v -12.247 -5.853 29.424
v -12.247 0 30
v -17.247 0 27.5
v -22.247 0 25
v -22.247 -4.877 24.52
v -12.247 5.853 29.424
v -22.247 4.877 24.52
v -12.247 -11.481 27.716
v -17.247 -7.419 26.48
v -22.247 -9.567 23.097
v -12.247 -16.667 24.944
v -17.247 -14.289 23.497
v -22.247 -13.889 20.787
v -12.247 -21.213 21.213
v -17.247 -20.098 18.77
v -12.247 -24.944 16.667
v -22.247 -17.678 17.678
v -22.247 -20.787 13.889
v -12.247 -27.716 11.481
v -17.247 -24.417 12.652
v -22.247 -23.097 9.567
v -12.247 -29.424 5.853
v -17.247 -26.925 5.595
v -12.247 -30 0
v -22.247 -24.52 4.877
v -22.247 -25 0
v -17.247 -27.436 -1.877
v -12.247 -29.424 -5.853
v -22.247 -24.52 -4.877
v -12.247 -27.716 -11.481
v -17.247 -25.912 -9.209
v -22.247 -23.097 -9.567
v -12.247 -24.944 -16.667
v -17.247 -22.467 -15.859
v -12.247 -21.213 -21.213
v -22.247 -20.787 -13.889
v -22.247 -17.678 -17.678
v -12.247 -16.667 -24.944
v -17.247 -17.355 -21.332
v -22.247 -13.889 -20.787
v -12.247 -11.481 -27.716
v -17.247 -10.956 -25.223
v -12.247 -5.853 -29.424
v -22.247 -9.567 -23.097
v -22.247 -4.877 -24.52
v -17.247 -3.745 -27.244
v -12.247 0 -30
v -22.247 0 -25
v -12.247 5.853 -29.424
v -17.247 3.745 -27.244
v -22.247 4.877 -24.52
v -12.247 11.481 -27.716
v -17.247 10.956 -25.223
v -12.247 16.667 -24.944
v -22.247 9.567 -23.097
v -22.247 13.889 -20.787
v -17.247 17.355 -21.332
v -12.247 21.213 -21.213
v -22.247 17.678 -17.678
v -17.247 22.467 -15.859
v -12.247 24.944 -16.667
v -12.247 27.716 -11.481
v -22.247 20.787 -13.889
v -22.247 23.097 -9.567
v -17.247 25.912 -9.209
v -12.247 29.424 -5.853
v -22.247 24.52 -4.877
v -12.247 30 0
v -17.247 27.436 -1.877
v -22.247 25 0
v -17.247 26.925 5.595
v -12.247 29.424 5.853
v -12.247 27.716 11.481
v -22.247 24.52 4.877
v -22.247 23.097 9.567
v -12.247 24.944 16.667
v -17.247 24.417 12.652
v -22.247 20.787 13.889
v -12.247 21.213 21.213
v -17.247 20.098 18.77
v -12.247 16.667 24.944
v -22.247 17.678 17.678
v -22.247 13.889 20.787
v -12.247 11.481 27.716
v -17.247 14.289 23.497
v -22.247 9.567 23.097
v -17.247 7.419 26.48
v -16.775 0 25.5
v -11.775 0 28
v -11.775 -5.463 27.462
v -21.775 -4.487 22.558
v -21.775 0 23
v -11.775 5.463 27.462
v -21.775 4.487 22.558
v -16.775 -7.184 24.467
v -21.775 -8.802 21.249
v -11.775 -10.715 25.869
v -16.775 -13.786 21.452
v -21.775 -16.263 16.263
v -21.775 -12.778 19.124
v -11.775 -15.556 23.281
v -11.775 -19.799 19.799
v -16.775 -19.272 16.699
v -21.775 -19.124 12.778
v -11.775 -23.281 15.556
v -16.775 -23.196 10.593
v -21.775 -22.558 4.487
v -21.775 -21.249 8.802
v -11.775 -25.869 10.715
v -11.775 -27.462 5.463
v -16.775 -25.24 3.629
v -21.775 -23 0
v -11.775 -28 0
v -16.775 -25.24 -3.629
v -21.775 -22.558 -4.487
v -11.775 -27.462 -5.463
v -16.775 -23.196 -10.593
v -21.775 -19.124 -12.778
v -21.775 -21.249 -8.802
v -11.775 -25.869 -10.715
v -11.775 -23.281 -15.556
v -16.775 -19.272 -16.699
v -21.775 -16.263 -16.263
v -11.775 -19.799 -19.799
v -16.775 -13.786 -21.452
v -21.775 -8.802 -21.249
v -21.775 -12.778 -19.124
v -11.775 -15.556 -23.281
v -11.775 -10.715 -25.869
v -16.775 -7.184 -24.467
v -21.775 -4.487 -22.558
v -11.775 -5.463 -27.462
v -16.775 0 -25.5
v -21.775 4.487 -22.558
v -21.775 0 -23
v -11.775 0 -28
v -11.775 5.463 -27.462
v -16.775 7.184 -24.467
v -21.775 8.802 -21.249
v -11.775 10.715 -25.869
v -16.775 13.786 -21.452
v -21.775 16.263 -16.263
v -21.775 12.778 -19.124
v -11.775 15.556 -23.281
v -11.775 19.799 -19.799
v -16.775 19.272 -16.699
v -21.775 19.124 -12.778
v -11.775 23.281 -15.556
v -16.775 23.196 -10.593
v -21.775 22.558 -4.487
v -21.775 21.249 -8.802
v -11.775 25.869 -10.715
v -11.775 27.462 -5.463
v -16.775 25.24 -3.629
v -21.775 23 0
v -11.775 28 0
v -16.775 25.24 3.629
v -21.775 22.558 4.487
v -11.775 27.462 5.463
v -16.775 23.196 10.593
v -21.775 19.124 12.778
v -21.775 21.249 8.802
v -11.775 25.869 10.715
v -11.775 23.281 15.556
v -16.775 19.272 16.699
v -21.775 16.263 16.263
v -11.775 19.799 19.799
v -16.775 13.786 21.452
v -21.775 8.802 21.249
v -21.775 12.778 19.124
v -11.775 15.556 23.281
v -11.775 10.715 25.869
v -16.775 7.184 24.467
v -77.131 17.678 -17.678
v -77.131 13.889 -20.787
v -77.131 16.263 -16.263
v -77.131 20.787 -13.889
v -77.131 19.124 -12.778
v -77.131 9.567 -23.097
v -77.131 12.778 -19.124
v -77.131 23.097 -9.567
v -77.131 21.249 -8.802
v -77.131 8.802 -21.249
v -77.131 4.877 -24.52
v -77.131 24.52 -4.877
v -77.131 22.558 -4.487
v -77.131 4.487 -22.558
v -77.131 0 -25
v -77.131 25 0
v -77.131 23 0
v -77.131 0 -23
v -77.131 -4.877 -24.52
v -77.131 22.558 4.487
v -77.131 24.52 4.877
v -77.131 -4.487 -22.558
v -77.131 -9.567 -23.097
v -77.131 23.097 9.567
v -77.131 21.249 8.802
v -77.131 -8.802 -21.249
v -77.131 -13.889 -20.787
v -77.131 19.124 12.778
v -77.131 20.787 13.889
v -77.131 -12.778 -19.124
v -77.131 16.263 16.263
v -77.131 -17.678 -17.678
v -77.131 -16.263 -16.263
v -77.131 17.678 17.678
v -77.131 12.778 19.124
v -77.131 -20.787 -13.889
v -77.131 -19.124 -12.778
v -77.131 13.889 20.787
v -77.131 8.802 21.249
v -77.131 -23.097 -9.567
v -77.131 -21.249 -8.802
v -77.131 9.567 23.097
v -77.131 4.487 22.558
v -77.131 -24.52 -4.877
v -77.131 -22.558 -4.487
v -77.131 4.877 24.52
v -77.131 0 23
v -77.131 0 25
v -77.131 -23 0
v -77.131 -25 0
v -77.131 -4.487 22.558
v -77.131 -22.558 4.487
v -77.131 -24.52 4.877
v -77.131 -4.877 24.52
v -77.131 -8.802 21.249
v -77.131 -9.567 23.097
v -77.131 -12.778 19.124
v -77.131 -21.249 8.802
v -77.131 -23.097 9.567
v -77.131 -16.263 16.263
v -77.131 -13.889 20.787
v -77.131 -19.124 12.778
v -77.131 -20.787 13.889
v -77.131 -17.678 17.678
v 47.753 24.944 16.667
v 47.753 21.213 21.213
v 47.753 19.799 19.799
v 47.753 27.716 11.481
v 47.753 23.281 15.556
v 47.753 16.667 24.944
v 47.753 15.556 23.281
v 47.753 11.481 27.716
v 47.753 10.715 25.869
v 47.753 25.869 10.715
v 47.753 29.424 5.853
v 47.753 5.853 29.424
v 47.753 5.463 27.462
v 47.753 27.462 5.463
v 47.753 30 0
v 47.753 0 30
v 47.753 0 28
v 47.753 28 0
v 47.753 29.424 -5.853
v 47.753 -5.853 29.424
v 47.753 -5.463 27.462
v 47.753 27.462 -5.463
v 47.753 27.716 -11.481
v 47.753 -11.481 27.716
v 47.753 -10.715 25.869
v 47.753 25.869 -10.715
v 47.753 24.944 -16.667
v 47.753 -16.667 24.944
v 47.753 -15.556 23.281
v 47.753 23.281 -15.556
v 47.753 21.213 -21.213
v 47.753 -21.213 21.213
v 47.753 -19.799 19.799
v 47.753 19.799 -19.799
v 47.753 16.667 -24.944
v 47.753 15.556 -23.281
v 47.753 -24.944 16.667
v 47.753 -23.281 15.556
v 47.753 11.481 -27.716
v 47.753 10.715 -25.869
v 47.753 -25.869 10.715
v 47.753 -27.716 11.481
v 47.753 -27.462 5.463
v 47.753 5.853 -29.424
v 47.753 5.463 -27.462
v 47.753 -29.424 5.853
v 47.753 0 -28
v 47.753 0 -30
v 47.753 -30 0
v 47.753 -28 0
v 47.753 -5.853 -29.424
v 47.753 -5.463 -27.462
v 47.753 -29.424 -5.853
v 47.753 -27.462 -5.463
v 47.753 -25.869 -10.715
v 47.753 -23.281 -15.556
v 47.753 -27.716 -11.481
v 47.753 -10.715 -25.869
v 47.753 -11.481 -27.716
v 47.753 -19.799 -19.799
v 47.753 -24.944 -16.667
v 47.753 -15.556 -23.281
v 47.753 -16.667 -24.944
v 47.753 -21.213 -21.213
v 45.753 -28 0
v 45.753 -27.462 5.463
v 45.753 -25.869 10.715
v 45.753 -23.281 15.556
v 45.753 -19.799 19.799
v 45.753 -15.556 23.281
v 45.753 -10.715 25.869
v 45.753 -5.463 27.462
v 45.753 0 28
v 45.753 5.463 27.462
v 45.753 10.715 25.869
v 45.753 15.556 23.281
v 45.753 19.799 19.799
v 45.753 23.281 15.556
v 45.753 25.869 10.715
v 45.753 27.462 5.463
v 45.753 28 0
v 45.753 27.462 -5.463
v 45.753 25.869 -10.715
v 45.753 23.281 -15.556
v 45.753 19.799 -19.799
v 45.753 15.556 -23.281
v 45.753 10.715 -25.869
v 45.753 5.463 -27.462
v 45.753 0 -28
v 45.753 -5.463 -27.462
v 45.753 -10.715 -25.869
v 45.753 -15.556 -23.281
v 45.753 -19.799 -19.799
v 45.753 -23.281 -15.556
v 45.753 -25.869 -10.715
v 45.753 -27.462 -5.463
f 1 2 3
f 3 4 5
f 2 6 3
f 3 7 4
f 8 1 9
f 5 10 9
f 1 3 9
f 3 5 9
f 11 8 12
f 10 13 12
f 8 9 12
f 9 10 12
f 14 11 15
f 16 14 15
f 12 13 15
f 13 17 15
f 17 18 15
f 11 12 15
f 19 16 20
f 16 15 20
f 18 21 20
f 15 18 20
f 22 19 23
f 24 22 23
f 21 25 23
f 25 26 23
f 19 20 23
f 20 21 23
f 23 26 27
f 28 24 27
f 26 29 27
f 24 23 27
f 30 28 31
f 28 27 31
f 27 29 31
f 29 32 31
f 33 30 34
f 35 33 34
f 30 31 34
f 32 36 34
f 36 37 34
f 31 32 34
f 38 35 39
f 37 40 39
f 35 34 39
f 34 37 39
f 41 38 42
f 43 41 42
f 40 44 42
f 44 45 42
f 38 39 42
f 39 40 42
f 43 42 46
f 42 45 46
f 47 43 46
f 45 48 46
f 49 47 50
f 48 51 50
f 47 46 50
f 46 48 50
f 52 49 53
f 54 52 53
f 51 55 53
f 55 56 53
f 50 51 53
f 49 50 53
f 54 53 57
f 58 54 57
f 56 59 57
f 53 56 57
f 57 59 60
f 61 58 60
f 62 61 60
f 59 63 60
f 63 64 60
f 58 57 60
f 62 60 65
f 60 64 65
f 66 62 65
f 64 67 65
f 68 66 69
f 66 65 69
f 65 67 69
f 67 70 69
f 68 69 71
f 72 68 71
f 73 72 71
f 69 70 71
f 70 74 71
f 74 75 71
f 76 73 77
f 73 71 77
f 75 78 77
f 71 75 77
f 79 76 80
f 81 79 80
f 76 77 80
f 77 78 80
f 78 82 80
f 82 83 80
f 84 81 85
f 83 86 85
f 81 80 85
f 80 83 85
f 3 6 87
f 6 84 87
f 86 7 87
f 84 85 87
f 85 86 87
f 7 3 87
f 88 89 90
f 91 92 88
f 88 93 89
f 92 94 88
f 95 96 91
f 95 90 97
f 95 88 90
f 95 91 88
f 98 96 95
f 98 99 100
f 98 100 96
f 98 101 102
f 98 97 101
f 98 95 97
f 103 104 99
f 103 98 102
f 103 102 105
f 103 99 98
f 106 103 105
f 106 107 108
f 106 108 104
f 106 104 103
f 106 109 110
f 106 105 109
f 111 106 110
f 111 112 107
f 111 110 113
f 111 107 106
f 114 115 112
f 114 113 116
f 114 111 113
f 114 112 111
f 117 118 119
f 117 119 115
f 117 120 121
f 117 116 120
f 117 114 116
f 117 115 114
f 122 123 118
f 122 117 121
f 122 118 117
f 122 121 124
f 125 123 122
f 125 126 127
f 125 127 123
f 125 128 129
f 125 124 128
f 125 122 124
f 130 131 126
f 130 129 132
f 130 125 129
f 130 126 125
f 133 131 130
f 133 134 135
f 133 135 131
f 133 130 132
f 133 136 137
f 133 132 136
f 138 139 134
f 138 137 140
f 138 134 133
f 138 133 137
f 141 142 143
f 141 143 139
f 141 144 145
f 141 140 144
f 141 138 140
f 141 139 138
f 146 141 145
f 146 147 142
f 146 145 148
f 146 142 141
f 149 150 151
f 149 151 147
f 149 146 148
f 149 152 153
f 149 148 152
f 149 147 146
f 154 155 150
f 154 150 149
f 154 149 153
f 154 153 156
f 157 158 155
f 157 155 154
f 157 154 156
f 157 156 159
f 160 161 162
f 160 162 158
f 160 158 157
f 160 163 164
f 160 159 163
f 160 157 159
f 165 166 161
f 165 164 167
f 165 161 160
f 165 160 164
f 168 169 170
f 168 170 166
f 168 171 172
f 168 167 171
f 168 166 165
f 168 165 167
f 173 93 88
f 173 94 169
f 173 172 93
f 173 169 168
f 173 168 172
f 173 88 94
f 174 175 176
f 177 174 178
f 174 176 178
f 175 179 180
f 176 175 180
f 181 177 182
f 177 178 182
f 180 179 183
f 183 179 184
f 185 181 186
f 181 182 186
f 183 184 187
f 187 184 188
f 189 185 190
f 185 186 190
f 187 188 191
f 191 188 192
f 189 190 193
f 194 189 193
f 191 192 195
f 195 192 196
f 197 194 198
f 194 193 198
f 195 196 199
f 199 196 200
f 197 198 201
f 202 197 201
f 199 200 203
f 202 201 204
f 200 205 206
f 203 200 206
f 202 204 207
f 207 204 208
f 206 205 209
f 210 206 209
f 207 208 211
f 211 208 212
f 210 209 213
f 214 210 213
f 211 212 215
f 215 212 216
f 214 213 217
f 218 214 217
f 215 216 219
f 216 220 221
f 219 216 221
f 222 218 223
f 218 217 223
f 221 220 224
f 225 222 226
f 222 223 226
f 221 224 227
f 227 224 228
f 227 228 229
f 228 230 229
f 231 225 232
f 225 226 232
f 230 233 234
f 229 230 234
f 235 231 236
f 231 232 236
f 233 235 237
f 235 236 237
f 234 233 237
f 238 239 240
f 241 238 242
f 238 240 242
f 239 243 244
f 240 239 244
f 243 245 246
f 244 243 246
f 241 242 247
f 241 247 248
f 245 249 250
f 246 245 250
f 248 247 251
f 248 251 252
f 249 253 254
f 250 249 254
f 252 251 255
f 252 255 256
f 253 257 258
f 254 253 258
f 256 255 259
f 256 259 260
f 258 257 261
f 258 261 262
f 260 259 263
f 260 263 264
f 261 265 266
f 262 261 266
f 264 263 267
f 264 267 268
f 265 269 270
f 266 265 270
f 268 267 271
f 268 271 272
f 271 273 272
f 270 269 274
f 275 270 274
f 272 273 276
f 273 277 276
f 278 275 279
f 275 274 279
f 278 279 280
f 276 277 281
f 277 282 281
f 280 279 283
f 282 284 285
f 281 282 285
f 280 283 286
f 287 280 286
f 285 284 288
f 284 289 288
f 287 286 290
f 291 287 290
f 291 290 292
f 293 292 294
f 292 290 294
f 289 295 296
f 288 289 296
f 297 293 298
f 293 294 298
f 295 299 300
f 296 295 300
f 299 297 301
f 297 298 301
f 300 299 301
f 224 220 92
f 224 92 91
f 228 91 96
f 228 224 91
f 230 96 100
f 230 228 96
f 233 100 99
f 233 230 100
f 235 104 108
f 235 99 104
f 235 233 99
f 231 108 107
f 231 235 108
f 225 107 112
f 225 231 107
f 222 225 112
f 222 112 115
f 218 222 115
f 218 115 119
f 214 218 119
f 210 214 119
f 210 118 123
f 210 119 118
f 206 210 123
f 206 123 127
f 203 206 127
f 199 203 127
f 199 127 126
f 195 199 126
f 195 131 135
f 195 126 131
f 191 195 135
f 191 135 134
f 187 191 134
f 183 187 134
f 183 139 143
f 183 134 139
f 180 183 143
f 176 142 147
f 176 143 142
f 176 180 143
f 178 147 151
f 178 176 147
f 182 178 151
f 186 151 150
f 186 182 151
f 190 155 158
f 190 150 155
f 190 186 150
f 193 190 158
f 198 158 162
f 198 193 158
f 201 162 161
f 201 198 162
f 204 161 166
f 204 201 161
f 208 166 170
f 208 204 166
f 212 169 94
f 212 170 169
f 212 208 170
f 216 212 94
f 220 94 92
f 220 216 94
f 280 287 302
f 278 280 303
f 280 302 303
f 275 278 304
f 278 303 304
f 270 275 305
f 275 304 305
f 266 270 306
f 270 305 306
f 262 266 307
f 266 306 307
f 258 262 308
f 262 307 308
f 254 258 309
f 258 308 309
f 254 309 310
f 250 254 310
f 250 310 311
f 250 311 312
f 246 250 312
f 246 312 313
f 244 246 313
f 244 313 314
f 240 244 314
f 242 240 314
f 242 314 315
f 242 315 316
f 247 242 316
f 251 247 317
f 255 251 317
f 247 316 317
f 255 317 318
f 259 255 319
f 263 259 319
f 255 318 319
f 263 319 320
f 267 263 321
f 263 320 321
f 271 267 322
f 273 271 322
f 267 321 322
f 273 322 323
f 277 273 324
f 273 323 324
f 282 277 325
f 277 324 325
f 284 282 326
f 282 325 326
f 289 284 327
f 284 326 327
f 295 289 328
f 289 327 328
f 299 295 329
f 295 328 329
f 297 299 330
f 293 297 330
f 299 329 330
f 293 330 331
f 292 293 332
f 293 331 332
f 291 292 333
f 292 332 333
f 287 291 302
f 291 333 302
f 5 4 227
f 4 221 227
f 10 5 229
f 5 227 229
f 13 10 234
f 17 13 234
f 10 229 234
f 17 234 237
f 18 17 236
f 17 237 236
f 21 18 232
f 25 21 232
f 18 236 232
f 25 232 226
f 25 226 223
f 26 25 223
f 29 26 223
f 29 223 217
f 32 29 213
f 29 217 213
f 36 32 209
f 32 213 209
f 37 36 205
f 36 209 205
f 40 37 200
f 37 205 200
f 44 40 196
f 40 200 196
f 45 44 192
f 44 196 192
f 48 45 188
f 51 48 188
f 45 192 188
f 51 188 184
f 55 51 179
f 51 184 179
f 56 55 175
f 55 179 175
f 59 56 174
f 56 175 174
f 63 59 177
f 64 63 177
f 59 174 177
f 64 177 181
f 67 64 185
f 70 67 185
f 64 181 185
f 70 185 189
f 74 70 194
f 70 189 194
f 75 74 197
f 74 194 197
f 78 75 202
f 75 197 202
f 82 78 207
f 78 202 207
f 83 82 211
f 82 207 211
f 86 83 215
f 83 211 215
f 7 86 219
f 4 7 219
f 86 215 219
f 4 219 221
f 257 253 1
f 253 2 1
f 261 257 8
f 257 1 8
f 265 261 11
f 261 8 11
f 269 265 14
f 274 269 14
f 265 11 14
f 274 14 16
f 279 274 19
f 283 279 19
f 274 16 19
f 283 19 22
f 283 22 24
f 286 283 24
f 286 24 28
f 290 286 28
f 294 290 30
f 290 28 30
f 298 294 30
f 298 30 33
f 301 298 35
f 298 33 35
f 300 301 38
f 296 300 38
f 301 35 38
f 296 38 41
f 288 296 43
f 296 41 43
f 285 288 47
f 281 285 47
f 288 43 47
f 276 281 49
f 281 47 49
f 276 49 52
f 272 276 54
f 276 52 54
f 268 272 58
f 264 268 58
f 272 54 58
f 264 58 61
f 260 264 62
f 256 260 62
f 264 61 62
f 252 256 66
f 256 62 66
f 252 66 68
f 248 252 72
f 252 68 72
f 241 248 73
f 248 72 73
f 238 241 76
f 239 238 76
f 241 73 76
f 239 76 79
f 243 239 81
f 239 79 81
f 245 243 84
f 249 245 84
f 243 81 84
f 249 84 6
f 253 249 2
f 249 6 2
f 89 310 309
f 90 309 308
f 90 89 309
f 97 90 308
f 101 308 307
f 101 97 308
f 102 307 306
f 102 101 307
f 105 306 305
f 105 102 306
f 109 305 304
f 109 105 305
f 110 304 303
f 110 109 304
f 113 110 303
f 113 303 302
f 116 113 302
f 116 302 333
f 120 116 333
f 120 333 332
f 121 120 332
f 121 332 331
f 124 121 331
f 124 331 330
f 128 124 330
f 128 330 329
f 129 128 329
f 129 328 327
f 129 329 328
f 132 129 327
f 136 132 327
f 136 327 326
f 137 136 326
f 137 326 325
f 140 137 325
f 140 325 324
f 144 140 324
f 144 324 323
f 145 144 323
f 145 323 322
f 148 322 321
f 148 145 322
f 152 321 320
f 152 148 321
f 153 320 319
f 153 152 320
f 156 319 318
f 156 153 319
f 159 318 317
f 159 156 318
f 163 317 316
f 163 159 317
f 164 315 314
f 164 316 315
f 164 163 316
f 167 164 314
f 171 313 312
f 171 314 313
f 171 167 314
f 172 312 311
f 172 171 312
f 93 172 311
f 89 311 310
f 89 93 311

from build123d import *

# Parameters (mm, degrees)
F1_T     = -2
F2_R     = 28
F3_DEPTH = 25


with BuildPart() as f4:
    # F0 (on Front) → F4 (revolve)
    with BuildSketch(Plane.XZ):
        Polygon((47.7527889609, 0), (47.7527889609, 30), (-12.2472110391, 30), (-22.2472110391, 25), (-77.1310710907, 25), (-77.1310710907, 0), align=None)
    revolve(axis=Axis((-5.2267275751, 0, 0), (1, 0, 0)))

    # F1
    f1_openings = [f4.faces().sort_by_distance(p)[0] for p in [
        (-77.131071, 0, 0),
    ]]
    offset(amount=F1_T, openings=f1_openings, kind=Kind.INTERSECTION)

    # F2 (on face) → F3 (cut)
    with BuildSketch(Plane(origin=(45.7527889609, 0, 0), x_dir=(0, -1, 0), z_dir=(-1, 0, 0))):
        Circle(F2_R)
    extrude(amount=-F3_DEPTH, mode=Mode.SUBTRACT)


solid = f4.part
